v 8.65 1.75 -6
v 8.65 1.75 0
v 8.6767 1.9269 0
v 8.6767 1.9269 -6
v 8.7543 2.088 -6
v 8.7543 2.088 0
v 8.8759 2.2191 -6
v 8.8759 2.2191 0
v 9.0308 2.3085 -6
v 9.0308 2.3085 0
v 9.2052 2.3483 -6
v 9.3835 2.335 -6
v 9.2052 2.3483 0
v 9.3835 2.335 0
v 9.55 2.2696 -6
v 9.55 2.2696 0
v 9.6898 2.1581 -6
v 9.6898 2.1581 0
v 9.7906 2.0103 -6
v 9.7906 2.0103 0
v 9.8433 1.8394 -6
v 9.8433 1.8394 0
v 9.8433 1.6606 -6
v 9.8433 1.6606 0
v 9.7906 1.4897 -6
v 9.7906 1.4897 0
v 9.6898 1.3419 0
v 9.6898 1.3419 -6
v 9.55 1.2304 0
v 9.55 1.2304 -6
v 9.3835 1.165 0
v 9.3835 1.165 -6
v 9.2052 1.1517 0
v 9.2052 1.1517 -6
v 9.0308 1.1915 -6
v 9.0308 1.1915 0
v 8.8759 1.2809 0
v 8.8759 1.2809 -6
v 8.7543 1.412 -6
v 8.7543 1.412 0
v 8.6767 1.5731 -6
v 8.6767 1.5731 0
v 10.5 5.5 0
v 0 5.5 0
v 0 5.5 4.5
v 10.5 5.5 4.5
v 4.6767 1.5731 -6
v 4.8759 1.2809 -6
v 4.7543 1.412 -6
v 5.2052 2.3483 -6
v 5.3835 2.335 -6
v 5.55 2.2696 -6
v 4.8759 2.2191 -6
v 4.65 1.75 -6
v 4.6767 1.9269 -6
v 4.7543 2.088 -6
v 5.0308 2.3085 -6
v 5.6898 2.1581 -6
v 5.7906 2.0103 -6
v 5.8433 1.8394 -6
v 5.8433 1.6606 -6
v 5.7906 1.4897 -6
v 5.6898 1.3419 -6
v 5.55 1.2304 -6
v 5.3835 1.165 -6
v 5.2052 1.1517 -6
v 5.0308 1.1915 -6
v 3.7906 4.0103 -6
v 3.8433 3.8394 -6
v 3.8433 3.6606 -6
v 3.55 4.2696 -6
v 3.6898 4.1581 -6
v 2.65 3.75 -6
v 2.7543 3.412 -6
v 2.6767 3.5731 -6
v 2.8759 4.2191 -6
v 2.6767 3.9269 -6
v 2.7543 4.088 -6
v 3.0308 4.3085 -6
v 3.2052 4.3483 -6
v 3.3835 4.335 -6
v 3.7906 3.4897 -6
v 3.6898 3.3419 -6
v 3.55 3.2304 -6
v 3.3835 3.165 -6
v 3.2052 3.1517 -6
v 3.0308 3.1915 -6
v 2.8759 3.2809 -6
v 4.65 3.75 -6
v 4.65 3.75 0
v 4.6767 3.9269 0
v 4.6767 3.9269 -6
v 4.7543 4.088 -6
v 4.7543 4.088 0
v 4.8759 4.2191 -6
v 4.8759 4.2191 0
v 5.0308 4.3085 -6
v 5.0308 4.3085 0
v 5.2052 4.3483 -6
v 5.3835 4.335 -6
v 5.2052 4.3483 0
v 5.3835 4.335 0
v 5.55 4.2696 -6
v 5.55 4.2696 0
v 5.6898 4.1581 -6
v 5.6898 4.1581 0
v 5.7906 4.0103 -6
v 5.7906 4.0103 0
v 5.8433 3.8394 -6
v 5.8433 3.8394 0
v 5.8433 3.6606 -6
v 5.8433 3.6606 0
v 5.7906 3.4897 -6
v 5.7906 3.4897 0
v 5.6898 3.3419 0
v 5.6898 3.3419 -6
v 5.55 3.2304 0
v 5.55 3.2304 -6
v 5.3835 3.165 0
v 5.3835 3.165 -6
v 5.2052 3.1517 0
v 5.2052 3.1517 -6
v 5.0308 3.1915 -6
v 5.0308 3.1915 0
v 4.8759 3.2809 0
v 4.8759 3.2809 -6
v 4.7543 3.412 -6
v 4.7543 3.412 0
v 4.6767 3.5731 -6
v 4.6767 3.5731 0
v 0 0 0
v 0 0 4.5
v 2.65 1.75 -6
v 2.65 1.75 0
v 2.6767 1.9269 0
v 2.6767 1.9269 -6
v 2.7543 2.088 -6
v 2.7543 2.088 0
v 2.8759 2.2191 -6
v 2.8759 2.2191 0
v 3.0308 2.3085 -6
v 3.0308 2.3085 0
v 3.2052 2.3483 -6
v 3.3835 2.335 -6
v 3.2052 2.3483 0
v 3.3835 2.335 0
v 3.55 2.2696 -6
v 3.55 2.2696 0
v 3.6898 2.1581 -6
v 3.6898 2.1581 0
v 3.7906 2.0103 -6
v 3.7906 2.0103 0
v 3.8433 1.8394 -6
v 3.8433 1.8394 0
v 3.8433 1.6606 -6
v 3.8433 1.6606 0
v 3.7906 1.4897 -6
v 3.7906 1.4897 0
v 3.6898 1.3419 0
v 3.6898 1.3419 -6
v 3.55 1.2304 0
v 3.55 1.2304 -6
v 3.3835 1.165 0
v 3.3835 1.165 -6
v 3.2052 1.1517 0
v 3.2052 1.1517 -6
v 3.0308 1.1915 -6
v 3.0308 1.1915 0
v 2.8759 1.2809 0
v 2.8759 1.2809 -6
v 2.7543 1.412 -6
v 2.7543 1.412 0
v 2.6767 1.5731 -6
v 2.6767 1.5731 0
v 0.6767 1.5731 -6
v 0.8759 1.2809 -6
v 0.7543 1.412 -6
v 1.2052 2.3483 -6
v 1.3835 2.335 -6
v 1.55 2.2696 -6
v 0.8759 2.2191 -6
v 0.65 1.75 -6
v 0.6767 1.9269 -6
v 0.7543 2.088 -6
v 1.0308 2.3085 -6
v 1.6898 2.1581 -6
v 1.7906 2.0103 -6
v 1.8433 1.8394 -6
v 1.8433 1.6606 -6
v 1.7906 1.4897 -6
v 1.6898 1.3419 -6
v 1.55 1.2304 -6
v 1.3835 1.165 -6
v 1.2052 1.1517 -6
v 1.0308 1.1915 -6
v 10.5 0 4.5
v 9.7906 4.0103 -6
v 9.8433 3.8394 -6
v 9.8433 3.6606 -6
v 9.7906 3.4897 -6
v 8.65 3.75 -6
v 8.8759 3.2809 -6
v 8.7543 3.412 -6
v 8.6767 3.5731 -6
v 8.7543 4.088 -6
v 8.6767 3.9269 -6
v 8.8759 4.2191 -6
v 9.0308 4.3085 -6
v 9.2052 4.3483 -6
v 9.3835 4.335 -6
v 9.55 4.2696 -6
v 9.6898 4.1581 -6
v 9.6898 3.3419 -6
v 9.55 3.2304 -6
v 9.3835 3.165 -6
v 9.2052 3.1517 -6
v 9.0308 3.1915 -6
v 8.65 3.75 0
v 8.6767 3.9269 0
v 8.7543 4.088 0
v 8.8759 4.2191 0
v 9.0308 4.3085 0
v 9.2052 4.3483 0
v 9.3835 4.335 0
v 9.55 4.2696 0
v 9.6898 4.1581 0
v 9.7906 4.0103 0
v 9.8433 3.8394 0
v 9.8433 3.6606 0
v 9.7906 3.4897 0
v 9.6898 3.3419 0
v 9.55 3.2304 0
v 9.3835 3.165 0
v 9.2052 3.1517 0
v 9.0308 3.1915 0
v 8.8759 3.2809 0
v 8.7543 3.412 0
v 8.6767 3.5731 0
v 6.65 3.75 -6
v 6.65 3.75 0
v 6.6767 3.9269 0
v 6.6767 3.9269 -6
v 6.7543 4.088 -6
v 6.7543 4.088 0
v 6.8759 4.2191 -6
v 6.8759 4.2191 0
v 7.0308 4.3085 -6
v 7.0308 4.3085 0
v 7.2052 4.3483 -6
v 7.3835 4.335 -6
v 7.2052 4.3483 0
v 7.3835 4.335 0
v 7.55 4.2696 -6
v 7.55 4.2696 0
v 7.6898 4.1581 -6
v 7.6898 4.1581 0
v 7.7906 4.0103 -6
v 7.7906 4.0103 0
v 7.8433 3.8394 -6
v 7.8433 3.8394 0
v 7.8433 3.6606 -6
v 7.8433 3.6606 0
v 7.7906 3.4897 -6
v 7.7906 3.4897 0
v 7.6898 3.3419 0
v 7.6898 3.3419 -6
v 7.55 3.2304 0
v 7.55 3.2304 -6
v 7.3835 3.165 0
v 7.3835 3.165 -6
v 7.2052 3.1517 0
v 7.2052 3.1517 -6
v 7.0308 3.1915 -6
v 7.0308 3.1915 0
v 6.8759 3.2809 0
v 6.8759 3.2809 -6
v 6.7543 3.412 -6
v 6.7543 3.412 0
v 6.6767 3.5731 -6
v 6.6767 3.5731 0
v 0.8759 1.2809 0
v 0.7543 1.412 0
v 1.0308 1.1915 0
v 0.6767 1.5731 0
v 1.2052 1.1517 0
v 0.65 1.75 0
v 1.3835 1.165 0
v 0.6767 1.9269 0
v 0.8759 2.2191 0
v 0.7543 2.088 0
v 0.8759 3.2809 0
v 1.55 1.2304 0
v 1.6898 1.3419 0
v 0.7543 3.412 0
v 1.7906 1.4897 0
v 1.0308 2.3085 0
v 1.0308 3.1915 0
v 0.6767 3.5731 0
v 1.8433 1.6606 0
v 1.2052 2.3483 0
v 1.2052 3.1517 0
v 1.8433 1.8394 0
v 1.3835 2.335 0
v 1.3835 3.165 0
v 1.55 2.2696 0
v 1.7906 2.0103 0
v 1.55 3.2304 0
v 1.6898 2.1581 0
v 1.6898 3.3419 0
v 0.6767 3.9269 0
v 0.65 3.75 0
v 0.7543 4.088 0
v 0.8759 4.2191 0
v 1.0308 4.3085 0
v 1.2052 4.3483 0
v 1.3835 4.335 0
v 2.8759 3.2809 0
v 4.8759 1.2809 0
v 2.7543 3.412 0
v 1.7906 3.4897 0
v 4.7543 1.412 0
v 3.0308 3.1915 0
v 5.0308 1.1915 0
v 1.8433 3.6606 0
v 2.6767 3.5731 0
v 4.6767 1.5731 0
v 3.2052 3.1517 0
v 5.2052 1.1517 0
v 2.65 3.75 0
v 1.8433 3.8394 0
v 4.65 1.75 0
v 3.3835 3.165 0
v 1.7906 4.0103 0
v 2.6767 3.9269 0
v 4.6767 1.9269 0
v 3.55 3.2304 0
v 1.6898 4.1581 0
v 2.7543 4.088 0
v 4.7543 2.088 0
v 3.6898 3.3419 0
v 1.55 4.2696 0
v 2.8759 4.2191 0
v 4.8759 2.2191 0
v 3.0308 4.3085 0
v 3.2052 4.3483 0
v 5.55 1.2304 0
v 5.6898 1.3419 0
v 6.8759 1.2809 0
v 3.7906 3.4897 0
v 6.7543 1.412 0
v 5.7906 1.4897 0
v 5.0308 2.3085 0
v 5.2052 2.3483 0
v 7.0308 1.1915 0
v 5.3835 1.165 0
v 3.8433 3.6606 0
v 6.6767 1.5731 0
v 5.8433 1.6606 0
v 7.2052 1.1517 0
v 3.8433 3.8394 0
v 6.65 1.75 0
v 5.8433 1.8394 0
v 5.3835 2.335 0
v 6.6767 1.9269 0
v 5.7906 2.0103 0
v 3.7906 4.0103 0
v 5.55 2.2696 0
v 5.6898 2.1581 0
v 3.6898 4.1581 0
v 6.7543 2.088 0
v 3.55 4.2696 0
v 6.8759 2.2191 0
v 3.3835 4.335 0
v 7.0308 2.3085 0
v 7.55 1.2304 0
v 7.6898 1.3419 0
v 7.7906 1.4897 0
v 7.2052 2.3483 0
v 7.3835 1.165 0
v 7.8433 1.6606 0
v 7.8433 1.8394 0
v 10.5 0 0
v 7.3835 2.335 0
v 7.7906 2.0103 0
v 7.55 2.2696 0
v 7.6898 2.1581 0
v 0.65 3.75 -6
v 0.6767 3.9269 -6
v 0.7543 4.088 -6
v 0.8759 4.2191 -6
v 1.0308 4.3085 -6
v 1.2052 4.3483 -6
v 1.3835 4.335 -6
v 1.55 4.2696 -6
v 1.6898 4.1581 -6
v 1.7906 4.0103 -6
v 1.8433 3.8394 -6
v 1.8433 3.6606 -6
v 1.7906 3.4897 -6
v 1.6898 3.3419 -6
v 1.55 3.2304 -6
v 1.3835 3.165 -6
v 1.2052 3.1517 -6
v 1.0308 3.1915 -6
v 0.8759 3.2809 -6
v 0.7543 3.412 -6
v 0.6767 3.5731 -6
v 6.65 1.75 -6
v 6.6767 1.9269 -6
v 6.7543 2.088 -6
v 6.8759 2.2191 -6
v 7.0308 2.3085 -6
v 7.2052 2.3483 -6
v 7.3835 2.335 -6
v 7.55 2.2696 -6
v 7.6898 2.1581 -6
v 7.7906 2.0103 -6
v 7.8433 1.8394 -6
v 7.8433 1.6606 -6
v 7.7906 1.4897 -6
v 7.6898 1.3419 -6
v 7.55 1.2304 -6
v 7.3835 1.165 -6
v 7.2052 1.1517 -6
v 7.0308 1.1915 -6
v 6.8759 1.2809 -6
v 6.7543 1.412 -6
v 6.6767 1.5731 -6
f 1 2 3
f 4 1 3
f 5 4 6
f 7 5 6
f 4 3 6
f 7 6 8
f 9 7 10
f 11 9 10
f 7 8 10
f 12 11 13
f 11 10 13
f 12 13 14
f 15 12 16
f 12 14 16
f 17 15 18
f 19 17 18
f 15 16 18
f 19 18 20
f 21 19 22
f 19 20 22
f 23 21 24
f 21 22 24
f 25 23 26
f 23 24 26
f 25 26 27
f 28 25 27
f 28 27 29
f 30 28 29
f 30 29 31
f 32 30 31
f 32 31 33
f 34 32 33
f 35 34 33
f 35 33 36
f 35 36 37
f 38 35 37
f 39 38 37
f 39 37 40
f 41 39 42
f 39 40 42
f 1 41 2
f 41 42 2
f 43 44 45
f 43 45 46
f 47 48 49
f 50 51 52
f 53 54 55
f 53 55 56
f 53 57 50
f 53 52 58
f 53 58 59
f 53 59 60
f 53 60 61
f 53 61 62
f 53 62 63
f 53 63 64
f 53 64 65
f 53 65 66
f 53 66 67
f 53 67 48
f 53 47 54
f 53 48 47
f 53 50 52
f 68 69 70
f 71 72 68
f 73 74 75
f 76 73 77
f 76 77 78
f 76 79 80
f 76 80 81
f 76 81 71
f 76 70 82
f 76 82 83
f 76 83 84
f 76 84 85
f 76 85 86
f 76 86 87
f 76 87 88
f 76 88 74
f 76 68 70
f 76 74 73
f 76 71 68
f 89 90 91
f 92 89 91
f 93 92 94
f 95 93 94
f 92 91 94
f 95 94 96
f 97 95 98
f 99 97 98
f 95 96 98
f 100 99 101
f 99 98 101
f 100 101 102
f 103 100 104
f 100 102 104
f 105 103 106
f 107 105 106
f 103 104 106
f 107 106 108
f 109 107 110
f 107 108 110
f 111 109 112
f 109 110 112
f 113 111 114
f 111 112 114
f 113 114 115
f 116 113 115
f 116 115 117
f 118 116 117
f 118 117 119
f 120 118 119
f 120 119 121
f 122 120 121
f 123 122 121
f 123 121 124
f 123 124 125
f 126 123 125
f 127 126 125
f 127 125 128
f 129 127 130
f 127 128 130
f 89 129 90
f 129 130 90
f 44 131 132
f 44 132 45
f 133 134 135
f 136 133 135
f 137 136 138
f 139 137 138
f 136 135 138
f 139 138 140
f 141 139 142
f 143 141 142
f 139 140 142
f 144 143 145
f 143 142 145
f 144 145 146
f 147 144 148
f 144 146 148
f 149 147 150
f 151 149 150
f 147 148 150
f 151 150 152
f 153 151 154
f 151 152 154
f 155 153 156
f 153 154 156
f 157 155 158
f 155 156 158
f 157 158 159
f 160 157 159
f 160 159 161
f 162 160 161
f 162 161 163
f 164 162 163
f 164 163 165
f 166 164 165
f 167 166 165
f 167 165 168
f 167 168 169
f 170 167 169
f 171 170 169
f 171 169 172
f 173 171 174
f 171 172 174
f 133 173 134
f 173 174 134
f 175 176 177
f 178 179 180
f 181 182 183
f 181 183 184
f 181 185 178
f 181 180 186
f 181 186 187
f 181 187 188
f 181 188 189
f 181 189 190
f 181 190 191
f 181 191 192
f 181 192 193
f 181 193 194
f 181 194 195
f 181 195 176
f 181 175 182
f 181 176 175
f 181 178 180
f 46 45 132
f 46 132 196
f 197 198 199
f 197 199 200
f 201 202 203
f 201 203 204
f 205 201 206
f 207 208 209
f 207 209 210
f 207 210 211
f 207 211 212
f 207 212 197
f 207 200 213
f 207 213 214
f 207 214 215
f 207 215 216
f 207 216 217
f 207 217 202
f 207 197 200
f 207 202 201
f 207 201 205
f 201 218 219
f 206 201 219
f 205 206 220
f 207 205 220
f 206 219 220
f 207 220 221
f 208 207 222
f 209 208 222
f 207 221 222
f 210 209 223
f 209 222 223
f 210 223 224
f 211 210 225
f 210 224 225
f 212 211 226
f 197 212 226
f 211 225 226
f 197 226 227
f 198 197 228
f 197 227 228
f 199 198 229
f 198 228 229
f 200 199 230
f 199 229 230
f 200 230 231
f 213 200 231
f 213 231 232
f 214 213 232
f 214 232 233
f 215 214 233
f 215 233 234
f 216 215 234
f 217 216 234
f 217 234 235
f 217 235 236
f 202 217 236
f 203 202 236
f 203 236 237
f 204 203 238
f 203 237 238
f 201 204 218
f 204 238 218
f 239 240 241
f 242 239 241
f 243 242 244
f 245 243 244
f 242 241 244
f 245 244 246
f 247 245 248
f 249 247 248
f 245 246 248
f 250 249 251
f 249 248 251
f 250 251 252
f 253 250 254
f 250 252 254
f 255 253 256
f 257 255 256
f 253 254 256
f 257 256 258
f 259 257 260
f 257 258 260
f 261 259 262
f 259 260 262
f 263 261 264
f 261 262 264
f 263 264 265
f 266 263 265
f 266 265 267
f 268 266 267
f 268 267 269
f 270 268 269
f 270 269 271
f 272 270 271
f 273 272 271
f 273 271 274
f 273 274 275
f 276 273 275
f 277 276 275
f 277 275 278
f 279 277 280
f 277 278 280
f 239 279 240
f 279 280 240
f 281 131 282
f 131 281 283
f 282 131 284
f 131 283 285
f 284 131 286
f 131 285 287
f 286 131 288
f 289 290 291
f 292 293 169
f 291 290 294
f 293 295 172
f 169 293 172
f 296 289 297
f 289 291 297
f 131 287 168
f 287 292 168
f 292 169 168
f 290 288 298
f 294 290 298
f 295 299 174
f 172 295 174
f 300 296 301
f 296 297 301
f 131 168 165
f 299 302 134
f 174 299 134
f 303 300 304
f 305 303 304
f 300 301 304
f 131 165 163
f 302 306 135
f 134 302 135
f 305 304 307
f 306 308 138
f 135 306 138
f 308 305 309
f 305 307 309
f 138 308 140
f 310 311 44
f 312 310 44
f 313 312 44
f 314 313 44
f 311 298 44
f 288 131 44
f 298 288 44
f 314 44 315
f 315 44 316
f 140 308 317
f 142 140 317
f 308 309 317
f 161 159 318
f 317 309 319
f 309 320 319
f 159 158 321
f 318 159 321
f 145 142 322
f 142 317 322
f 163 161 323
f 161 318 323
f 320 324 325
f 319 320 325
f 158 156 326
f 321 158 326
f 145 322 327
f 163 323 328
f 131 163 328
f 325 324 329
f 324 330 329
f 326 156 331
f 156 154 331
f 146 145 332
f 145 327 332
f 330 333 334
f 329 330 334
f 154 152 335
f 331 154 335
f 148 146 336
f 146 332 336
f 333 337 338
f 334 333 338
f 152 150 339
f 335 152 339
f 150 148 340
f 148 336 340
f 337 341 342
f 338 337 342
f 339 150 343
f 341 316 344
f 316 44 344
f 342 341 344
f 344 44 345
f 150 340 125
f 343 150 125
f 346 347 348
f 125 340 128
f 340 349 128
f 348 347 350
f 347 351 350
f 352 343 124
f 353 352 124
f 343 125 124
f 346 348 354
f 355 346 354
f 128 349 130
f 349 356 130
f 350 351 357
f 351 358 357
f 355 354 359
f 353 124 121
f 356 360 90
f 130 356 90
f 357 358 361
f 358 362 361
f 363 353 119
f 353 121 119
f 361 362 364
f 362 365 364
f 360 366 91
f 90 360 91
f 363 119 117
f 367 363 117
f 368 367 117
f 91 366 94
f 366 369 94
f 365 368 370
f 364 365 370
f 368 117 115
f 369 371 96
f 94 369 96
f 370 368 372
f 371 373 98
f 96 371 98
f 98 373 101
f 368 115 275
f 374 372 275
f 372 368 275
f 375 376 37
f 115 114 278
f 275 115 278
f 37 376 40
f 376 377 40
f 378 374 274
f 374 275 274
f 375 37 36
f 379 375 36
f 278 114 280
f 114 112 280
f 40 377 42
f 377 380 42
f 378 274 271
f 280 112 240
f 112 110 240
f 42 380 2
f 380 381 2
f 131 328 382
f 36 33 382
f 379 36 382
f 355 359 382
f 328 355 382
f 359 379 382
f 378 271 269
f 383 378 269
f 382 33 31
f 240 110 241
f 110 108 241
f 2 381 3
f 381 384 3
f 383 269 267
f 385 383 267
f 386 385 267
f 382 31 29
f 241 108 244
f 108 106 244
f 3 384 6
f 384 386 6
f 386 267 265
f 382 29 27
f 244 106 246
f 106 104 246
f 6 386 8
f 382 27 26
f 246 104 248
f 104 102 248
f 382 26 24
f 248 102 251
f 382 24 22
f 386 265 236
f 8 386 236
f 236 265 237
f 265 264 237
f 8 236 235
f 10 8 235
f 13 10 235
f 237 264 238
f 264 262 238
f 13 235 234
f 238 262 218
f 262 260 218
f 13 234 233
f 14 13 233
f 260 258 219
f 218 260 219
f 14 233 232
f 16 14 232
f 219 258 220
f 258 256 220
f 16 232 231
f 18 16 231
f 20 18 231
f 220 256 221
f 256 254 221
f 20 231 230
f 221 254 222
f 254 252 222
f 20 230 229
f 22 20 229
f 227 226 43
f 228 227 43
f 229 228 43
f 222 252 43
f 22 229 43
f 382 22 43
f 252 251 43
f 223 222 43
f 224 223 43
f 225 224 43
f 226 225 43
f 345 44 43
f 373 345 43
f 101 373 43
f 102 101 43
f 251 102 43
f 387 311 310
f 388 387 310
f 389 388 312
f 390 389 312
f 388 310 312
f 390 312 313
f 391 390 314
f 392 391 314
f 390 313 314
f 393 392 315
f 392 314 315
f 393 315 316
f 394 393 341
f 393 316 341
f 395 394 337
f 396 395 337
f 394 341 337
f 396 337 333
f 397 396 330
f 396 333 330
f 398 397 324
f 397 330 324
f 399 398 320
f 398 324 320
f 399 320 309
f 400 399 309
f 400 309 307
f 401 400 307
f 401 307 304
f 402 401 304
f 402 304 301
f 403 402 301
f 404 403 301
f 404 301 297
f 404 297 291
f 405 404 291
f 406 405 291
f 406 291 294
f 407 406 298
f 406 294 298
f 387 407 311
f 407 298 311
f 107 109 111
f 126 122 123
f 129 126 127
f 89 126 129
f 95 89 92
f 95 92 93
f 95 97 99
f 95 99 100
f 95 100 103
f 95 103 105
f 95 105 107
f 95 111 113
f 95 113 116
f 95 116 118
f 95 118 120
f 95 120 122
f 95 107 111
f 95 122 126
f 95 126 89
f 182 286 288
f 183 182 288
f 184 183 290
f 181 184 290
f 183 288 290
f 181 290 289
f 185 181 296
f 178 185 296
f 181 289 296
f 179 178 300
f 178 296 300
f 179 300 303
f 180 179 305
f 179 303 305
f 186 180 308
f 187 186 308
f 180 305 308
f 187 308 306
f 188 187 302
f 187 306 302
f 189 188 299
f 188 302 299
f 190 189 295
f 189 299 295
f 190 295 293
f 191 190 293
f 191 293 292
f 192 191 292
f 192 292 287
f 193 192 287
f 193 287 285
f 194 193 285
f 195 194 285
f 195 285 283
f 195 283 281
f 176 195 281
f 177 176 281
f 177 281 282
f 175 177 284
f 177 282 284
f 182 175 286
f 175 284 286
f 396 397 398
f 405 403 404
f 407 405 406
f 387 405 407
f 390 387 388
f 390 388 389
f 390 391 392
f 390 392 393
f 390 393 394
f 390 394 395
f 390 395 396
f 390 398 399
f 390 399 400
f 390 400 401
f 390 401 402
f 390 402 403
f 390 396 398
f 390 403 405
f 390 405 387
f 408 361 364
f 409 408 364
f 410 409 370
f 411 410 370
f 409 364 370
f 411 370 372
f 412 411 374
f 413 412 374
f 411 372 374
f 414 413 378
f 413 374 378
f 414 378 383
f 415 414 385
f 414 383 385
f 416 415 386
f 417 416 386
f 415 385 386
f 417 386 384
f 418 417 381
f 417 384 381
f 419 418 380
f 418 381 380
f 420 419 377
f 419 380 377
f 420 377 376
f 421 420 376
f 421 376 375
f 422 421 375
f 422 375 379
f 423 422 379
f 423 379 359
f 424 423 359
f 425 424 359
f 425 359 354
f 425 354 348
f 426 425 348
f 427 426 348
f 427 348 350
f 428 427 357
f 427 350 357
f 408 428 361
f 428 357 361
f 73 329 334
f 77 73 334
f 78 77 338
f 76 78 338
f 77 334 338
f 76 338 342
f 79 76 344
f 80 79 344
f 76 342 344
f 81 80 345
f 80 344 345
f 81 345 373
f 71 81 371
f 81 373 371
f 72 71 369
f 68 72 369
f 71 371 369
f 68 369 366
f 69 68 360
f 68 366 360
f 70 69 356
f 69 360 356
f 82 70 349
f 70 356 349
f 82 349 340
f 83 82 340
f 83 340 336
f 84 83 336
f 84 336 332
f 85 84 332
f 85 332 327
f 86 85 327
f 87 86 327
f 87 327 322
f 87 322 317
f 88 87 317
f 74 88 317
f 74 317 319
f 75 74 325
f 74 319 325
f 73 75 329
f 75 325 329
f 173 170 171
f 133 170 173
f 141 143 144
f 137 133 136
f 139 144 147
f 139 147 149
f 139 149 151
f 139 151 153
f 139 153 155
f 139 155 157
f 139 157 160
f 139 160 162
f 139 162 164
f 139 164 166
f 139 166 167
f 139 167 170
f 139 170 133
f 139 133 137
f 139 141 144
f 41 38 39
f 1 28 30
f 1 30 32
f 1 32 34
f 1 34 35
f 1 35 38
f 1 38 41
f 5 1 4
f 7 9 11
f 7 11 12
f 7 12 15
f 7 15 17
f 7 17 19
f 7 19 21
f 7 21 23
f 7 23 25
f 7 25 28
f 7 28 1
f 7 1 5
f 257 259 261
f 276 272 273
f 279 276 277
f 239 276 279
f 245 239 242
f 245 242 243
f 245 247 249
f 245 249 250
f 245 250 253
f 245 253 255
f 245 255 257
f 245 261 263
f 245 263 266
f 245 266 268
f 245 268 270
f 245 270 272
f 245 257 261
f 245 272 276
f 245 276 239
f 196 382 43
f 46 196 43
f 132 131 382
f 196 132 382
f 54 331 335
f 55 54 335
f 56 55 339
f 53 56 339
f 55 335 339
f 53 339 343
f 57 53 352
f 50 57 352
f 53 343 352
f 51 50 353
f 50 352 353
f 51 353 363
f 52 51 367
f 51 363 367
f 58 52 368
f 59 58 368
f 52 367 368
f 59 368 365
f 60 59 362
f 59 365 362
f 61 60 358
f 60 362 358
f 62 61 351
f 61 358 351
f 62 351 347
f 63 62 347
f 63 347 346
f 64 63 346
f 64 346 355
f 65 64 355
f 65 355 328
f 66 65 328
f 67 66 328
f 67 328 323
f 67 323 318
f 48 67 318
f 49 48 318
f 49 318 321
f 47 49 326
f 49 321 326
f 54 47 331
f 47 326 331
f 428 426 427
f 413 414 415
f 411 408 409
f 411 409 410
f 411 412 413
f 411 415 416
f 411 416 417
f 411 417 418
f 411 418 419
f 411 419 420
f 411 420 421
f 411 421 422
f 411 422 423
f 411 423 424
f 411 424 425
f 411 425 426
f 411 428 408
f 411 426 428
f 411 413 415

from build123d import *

# Parameters (mm, degrees)
SKETCH1_W           = 10.5
SKETCH1_H           = 5.5
BOSS_EXTRUDE1_DEPTH = 4.5
SKETCH2_R           = 0.6
BOSS_EXTRUDE2_DEPTH = 6


with BuildPart() as part:
    # Sketch1 → Boss-Extrude1 (new body)
    with BuildSketch(Plane.XY):
        with Locations((5.25, 2.75)):
            Rectangle(SKETCH1_W, SKETCH1_H)
    extrude(amount=BOSS_EXTRUDE1_DEPTH)

    # Sketch2 → Boss-Extrude2 (add)
    with BuildSketch(Plane(origin=(0, 0, 0), x_dir=(-1, 0, 0), z_dir=(0, 0, -1))):
        with Locations((-9.25, 3.75)):
            Circle(SKETCH2_R)
        with Locations((-9.25, 1.75)):
            Circle(SKETCH2_R)
        with Locations((-5.25, 1.75)):
            Circle(SKETCH2_R)
        with Locations((-7.25, 1.75)):
            Circle(SKETCH2_R)
        with Locations((-7.25, 3.75)):
            Circle(SKETCH2_R)
        with Locations((-5.25, 3.75)):
            Circle(SKETCH2_R)
        with Locations((-3.25, 3.75)):
            Circle(SKETCH2_R)
        with Locations((-1.25, 3.75)):
            Circle(SKETCH2_R)
        with Locations((-1.25, 1.75)):
            Circle(SKETCH2_R)
        with Locations((-3.25, 1.75)):
            Circle(SKETCH2_R)
    extrude(amount=BOSS_EXTRUDE2_DEPTH)


solid = part.part
